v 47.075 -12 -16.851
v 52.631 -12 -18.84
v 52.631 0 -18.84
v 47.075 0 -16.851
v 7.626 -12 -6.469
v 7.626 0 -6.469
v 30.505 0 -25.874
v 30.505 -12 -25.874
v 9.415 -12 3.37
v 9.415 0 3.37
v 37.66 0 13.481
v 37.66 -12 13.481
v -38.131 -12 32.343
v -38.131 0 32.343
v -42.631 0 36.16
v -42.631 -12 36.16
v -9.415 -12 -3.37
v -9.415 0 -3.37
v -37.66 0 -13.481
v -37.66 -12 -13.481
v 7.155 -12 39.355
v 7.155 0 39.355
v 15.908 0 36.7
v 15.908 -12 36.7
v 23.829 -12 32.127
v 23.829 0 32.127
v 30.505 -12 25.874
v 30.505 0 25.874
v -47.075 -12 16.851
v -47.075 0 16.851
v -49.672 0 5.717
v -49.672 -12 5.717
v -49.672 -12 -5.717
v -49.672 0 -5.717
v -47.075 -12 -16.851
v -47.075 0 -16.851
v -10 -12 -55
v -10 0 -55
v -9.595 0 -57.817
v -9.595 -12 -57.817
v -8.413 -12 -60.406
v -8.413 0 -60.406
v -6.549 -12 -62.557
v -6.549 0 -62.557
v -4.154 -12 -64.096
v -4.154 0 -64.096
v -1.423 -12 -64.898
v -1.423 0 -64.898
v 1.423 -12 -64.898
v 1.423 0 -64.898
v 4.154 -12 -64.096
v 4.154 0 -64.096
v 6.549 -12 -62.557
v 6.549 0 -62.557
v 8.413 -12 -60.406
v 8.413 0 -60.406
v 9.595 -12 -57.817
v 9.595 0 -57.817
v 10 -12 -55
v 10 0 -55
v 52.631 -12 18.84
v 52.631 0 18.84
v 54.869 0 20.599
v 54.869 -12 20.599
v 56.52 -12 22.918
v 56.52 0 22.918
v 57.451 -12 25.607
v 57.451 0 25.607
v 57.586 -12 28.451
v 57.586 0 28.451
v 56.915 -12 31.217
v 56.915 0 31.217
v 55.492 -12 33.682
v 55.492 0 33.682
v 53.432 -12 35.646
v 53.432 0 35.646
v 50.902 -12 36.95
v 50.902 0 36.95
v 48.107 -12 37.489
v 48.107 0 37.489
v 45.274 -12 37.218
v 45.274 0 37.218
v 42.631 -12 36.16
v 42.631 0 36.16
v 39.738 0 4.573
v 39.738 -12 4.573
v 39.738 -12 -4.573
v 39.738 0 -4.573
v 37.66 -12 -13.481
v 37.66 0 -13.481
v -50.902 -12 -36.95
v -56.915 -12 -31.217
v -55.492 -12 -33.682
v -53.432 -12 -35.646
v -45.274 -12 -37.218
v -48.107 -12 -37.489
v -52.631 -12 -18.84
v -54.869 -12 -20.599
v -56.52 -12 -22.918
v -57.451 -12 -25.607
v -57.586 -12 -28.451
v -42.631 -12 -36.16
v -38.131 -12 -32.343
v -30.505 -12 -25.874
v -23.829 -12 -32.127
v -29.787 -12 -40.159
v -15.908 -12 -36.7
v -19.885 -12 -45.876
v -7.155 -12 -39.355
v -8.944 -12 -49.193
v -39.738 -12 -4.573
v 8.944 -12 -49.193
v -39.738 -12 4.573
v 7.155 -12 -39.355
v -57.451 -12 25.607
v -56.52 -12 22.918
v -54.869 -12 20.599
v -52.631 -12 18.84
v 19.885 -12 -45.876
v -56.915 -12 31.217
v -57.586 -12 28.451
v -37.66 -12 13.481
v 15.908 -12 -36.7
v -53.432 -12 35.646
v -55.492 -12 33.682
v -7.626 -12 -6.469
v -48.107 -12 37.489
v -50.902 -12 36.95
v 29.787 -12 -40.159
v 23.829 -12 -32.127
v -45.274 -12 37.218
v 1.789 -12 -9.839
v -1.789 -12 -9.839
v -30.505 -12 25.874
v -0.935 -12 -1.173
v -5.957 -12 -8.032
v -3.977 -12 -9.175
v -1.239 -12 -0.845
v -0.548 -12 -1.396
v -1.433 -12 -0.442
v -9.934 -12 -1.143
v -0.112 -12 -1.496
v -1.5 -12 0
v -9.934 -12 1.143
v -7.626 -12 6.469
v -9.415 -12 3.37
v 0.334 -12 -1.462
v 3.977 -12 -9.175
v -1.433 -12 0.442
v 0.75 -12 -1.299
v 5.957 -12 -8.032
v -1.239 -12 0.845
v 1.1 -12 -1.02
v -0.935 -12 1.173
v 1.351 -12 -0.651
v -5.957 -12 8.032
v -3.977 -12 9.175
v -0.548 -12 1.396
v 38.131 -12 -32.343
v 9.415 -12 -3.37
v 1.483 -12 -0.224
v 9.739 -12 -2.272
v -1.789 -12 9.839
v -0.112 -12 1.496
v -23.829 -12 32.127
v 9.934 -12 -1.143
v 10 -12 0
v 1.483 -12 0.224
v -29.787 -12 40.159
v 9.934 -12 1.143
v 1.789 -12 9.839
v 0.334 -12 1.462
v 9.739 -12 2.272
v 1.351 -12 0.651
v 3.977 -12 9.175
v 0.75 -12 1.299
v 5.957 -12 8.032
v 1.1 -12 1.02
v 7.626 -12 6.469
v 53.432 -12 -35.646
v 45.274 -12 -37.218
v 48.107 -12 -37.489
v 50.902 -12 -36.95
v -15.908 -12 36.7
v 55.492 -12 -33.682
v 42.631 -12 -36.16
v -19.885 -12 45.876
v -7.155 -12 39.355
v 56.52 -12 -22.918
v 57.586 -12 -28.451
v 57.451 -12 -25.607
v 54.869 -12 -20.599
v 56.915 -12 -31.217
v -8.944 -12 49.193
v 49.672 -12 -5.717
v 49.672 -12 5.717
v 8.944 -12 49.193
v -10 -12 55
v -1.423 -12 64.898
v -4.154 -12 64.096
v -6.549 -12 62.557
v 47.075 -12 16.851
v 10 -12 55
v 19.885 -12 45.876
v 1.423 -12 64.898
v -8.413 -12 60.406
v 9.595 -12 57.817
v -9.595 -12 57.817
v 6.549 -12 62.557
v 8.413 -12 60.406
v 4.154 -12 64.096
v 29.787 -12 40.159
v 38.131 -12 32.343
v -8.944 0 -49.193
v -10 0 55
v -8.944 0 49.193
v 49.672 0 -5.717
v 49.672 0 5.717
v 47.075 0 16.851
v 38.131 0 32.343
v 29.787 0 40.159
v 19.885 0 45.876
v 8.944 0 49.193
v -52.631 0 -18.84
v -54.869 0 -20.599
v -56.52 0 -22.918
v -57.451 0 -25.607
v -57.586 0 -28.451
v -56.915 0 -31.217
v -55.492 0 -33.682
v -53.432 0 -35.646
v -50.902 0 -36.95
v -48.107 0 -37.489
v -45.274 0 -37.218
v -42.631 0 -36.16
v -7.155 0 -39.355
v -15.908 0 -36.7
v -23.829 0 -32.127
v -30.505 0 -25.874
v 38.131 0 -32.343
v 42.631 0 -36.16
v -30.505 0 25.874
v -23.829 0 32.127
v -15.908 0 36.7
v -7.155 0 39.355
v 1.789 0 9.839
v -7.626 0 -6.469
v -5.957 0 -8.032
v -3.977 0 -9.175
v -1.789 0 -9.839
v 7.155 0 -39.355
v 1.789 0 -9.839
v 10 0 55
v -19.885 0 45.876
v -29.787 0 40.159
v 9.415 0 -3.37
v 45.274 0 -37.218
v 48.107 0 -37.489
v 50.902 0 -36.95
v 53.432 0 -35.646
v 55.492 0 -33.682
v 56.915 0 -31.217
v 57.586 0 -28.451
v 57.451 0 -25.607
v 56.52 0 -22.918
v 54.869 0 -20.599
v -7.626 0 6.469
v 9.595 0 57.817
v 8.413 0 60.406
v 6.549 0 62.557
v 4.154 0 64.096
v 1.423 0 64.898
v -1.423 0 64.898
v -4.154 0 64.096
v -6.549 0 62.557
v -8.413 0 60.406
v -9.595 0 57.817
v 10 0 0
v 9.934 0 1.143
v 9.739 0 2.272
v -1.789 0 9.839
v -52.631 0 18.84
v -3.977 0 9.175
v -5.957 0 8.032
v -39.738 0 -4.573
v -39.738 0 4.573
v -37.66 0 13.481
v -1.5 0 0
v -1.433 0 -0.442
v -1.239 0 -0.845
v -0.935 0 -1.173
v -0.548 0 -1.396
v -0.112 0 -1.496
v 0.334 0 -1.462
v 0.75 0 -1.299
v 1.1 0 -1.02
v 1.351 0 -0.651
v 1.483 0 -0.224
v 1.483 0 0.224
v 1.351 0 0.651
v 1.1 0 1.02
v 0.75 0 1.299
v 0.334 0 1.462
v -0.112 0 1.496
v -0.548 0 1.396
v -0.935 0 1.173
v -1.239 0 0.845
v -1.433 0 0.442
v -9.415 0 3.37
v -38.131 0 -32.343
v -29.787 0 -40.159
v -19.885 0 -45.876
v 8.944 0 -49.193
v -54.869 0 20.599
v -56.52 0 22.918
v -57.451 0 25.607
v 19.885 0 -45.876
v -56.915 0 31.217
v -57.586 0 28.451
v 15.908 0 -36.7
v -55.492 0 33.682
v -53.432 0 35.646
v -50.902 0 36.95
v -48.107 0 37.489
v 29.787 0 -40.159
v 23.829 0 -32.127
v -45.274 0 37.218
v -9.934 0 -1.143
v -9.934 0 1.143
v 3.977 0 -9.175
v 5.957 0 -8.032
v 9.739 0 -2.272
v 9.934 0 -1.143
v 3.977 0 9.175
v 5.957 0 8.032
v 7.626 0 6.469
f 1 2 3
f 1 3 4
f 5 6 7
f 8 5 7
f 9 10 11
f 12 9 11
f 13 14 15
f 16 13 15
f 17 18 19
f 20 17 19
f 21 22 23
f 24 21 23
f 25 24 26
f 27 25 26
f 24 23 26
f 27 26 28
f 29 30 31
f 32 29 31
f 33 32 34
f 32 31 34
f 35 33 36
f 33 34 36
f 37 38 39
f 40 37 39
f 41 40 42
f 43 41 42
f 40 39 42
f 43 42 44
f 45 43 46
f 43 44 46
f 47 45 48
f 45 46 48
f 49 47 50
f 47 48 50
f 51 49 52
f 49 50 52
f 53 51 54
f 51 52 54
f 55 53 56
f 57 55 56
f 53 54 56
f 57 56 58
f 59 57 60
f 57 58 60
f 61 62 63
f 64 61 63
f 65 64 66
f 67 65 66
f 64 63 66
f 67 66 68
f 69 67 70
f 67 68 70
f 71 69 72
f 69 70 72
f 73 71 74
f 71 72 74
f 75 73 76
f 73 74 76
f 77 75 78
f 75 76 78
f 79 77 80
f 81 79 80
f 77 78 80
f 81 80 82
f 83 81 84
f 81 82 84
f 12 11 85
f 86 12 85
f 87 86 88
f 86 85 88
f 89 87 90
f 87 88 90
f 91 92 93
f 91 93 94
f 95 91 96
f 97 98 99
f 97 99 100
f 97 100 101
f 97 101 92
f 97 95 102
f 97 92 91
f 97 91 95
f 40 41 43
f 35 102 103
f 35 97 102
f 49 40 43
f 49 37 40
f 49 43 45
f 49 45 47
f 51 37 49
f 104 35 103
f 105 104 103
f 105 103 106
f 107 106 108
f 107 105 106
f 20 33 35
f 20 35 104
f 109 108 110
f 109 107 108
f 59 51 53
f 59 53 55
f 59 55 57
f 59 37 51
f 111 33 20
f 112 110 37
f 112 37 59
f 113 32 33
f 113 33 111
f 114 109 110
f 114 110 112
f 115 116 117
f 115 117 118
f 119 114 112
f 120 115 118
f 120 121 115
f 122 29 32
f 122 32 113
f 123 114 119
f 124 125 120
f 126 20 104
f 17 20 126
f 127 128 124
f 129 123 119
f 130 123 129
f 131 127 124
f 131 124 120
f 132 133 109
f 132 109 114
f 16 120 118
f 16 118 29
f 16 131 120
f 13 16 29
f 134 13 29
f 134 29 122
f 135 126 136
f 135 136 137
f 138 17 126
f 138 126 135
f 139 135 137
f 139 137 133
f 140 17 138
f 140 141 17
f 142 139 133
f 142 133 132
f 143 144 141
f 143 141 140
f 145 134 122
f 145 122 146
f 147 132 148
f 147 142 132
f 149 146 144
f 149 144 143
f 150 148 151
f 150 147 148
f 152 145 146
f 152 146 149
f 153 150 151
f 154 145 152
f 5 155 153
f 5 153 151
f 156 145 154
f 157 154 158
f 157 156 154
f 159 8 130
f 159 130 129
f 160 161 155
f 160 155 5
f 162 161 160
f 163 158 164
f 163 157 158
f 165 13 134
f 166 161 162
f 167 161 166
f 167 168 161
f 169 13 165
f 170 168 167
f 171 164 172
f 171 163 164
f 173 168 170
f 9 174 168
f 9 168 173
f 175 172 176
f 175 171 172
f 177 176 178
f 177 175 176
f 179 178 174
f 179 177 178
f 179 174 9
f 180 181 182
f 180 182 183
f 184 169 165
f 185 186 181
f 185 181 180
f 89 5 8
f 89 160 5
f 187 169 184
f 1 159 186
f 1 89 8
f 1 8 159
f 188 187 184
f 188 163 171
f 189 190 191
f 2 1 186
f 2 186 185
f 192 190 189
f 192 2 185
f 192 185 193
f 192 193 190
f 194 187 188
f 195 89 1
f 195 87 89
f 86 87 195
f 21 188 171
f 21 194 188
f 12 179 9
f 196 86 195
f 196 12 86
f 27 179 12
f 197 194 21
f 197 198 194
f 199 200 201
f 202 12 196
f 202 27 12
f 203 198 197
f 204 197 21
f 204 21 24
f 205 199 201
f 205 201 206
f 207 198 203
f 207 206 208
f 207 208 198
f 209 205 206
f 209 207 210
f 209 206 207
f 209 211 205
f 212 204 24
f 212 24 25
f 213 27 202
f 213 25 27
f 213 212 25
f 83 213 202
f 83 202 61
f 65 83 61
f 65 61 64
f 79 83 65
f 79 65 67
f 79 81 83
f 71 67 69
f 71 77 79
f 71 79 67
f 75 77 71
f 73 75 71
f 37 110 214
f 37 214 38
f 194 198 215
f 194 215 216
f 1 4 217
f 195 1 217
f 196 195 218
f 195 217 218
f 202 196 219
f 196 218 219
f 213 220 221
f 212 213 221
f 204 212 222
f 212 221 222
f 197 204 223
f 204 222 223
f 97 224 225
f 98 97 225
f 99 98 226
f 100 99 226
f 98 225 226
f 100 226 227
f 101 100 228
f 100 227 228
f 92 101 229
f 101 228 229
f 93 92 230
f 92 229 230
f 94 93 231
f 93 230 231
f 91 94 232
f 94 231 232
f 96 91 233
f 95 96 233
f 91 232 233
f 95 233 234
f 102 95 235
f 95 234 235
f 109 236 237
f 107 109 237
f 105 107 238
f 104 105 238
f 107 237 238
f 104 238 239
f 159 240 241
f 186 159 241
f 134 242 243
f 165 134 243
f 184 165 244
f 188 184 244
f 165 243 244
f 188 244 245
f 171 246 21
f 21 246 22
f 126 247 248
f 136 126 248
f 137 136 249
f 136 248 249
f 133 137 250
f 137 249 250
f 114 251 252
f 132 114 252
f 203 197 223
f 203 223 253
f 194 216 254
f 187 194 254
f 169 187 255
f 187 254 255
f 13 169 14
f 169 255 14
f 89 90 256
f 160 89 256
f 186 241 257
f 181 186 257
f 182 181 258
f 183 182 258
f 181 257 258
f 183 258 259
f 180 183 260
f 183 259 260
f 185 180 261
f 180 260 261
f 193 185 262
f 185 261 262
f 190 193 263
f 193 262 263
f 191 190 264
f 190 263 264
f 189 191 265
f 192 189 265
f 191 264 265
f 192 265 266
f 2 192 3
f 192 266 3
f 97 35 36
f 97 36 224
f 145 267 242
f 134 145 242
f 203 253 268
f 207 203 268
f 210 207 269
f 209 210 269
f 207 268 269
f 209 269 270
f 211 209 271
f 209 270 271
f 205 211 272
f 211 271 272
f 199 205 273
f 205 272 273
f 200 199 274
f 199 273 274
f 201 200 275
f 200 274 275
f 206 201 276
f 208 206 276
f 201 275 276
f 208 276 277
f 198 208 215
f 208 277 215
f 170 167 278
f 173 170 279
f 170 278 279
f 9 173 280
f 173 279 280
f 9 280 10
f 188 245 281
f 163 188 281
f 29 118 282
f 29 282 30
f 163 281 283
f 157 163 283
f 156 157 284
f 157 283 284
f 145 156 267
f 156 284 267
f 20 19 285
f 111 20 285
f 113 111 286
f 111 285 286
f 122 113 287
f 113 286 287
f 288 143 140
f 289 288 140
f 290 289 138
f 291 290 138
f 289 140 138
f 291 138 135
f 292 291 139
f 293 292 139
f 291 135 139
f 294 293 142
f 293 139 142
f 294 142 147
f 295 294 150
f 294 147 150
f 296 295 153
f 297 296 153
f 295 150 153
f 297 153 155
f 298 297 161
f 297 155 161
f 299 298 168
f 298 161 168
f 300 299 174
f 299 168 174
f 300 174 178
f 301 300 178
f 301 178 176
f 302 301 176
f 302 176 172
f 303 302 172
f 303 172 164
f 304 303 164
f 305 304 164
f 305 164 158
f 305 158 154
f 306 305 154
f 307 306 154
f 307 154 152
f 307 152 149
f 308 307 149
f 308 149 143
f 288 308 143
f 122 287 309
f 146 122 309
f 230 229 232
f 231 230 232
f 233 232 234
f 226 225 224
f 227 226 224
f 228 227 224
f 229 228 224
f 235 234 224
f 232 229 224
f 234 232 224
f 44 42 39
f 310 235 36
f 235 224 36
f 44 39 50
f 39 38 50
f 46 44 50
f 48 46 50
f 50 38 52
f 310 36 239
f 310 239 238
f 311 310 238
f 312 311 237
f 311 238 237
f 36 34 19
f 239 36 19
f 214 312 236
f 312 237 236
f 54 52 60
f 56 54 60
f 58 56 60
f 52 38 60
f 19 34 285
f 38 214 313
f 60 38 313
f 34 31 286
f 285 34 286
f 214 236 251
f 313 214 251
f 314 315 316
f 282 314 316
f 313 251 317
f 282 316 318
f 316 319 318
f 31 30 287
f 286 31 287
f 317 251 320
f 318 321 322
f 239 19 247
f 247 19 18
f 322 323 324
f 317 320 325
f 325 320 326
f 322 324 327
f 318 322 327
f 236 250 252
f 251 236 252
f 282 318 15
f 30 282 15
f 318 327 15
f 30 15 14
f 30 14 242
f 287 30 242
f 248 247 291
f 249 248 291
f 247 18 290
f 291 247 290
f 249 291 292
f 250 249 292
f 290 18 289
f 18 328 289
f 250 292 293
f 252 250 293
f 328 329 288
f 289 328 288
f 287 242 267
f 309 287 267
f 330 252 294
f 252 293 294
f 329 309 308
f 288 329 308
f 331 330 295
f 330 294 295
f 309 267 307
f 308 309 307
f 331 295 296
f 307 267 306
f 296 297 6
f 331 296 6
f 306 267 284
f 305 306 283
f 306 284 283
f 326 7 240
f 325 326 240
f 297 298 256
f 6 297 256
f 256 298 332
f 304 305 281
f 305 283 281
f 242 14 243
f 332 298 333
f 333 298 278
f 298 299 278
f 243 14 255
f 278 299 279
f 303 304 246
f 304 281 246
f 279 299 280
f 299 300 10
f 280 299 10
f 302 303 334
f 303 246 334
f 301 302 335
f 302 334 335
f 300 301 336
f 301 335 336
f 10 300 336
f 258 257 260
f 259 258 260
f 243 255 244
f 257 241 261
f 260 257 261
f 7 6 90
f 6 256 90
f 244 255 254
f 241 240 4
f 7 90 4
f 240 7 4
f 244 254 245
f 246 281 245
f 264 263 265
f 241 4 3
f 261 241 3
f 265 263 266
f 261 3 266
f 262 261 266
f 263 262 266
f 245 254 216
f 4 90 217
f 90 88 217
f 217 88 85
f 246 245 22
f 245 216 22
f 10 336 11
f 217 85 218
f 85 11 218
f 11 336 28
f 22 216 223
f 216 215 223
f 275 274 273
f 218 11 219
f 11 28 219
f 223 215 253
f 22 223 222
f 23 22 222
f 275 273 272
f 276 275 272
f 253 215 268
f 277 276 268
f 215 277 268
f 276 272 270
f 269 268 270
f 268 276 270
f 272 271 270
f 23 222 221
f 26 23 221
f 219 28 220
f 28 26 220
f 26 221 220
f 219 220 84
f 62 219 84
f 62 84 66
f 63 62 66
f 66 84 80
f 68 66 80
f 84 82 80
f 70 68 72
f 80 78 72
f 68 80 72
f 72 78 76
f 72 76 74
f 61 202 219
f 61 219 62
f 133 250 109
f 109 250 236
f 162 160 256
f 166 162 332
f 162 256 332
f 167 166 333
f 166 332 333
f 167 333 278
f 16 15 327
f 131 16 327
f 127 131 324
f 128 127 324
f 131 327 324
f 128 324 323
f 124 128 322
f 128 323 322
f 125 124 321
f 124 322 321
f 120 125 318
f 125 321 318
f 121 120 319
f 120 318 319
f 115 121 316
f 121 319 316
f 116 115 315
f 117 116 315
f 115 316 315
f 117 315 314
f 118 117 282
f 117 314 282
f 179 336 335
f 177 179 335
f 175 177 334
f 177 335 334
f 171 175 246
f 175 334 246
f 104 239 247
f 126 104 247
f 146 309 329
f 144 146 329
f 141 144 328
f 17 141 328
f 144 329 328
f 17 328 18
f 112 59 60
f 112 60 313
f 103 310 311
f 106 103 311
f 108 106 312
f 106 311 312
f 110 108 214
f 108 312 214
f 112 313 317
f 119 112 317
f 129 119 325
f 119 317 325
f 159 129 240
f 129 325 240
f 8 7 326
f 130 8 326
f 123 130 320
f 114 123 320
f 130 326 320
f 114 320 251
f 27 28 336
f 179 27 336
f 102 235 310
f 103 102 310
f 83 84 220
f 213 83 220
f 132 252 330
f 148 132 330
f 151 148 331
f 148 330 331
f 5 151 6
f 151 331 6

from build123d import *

# Parameters (mm, degrees)
F1_DEPTH = 1.2
F2_SCALE = 10
F4_D     = 3


with BuildPart() as f1:
    # F0 (on Front) → F1 (new body)
    with BuildSketch(Plane.XZ):
        with BuildLine():
            Line((-3.7659962211, 1.3480624848), (-4.7074952763, 1.685078106))
            ThreePointArc((-4.7074952763, 1.685078106), (-5, 0), (-4.7074952763, -1.685078106))
            Line((-4.7074952763, -1.685078106), (-3.7659962211, -1.3480624848))
            ThreePointArc((-3.7659962211, -1.3480624848), (-4, 0), (-3.7659962211, 1.3480624848))
        make_face()
        with BuildLine():
            Line((-3.0504544683, 2.5874171556), (-3.8130680853, 3.2342714445))
            Line((-3.8130680853, 3.2342714445), (-4.2631397208, 3.6160254038))
            ThreePointArc((-4.2631397208, 3.6160254038), (-5.6291651246, 3.25), (-5.2631397208, 1.8839745962))
            Line((-5.2631397208, 1.8839745962), (-4.7074952763, 1.685078106))
            Line((-4.7074952763, 1.685078106), (-3.7659962211, 1.3480624848))
            Line((-3.7659962211, 1.3480624848), (-0.9414990553, 0.3370156212))
            ThreePointArc((-0.9414990553, 0.3370156212), (-0.8660254038, 0.5), (-0.7626136171, 0.6468542889))
            Line((-0.7626136171, 0.6468542889), (-3.0504544683, 2.5874171556))
        make_face()
        with BuildLine():
            Line((-0.7155417528, 3.9354796404), (-0.894427191, 4.9193495505))
            ThreePointArc((-0.894427191, 4.9193495505), (-2.5, 4.3301270189), (-3.8130680853, 3.2342714445))
            Line((-3.8130680853, 3.2342714445), (-3.0504544683, 2.5874171556))
            ThreePointArc((-3.0504544683, 2.5874171556), (-2, 3.4641016151), (-0.7155417528, 3.9354796404))
        make_face()
        with BuildLine():
            Line((-1, 5.5), (-0.894427191, 4.9193495505))
            Line((-0.894427191, 4.9193495505), (-0.7155417528, 3.9354796404))
            Line((-0.7155417528, 3.9354796404), (-0.1788854382, 0.9838699101))
            ThreePointArc((-0.1788854382, 0.9838699101), (0, 1), (0.1788854382, 0.9838699101))
            Line((0.1788854382, 0.9838699101), (0.7155417528, 3.9354796404))
            Line((0.7155417528, 3.9354796404), (0.894427191, 4.9193495505))
            Line((0.894427191, 4.9193495505), (1, 5.5))
            ThreePointArc((1, 5.5), (0, 6.5), (-1, 5.5))
        make_face()
        with BuildLine():
            ThreePointArc((3.8130680853, 3.2342714445), (2.5, 4.3301270189), (0.894427191, 4.9193495505))
            Line((0.894427191, 4.9193495505), (0.7155417528, 3.9354796404))
            ThreePointArc((0.7155417528, 3.9354796404), (2, 3.4641016151), (3.0504544683, 2.5874171556))
            Line((3.0504544683, 2.5874171556), (3.8130680853, 3.2342714445))
        make_face()
        with BuildLine():
            Line((3.0504544683, 2.5874171556), (0.7626136171, 0.6468542889))
            ThreePointArc((0.7626136171, 0.6468542889), (0.8660254038, 0.5), (0.9414990553, 0.3370156212))
            Line((0.9414990553, 0.3370156212), (3.7659962211, 1.3480624848))
            Line((3.7659962211, 1.3480624848), (4.7074952763, 1.685078106))
            Line((4.7074952763, 1.685078106), (5.2631397208, 1.8839745962))
            ThreePointArc((5.2631397208, 1.8839745962), (5.6291651246, 3.25), (4.2631397208, 3.6160254038))
            Line((4.2631397208, 3.6160254038), (3.8130680853, 3.2342714445))
            Line((3.8130680853, 3.2342714445), (3.0504544683, 2.5874171556))
        make_face()
        with BuildLine():
            Line((4.7074952763, 1.685078106), (3.7659962211, 1.3480624848))
            ThreePointArc((3.7659962211, 1.3480624848), (4, 0), (3.7659962211, -1.3480624848))
            Line((3.7659962211, -1.3480624848), (4.7074952763, -1.685078106))
            ThreePointArc((4.7074952763, -1.685078106), (5, 0), (4.7074952763, 1.685078106))
        make_face()
        with BuildLine():
            Line((3.7659962211, -1.3480624848), (0.9414990553, -0.3370156212))
            ThreePointArc((0.9414990553, -0.3370156212), (0.8660254038, -0.5), (0.7626136171, -0.6468542889))
            Line((0.7626136171, -0.6468542889), (3.0504544683, -2.5874171556))
            Line((3.0504544683, -2.5874171556), (3.8130680853, -3.2342714445))
            Line((3.8130680853, -3.2342714445), (4.2631397208, -3.6160254038))
            ThreePointArc((4.2631397208, -3.6160254038), (5.6291651246, -3.25), (5.2631397208, -1.8839745962))
            Line((5.2631397208, -1.8839745962), (4.7074952763, -1.685078106))
            Line((4.7074952763, -1.685078106), (3.7659962211, -1.3480624848))
        make_face()
        with BuildLine():
            ThreePointArc((3.0504544683, -2.5874171556), (2, -3.4641016151), (0.7155417528, -3.9354796404))
            Line((0.7155417528, -3.9354796404), (0.894427191, -4.9193495505))
            ThreePointArc((0.894427191, -4.9193495505), (2.5, -4.3301270189), (3.8130680853, -3.2342714445))
            Line((3.8130680853, -3.2342714445), (3.0504544683, -2.5874171556))
        make_face()
        with BuildLine():
            ThreePointArc((0.1788854382, -0.9838699101), (0, -1), (-0.1788854382, -0.9838699101))
            Line((-0.1788854382, -0.9838699101), (-0.7155417528, -3.9354796404))
            Line((-0.7155417528, -3.9354796404), (-0.894427191, -4.9193495505))
            Line((-0.894427191, -4.9193495505), (-1, -5.5))
            ThreePointArc((-1, -5.5), (0, -6.5), (1, -5.5))
            Line((1, -5.5), (0.894427191, -4.9193495505))
            Line((0.894427191, -4.9193495505), (0.7155417528, -3.9354796404))
            Line((0.7155417528, -3.9354796404), (0.1788854382, -0.9838699101))
        make_face()
        with BuildLine():
            ThreePointArc((-0.7626136171, -0.6468542889), (-0.8660254038, -0.5), (-0.9414990553, -0.3370156212))
            Line((-0.9414990553, -0.3370156212), (-3.7659962211, -1.3480624848))
            Line((-3.7659962211, -1.3480624848), (-4.7074952763, -1.685078106))
            Line((-4.7074952763, -1.685078106), (-5.2631397208, -1.8839745962))
            ThreePointArc((-5.2631397208, -1.8839745962), (-5.6291651246, -3.25), (-4.2631397208, -3.6160254038))
            Line((-4.2631397208, -3.6160254038), (-3.8130680853, -3.2342714445))
            Line((-3.8130680853, -3.2342714445), (-3.0504544683, -2.5874171556))
            Line((-3.0504544683, -2.5874171556), (-0.7626136171, -0.6468542889))
        make_face()
        with BuildLine():
            ThreePointArc((0.1788854382, 0.9838699101), (0, 1), (-0.1788854382, 0.9838699101))
            ThreePointArc((-0.1788854382, 0.9838699101), (-0.5, 0.8660254038), (-0.7626136171, 0.6468542889))
            ThreePointArc((-0.7626136171, 0.6468542889), (-0.8660254038, 0.5), (-0.9414990553, 0.3370156212))
            ThreePointArc((-0.9414990553, 0.3370156212), (-1, 0), (-0.9414990553, -0.3370156212))
            ThreePointArc((-0.9414990553, -0.3370156212), (-0.8660254038, -0.5), (-0.7626136171, -0.6468542889))
            ThreePointArc((-0.7626136171, -0.6468542889), (-0.5, -0.8660254038), (-0.1788854382, -0.9838699101))
            ThreePointArc((-0.1788854382, -0.9838699101), (0, -1), (0.1788854382, -0.9838699101))
            ThreePointArc((0.1788854382, -0.9838699101), (0.5, -0.8660254038), (0.7626136171, -0.6468542889))
            ThreePointArc((0.7626136171, -0.6468542889), (0.8660254038, -0.5), (0.9414990553, -0.3370156212))
            ThreePointArc((0.9414990553, -0.3370156212), (0.9852662217, -0.1710276947), (1, 0))
            ThreePointArc((1, 0), (0.9852662217, 0.1710276947), (0.9414990553, 0.3370156212))
            ThreePointArc((0.9414990553, 0.3370156212), (0.8660254038, 0.5), (0.7626136171, 0.6468542889))
            ThreePointArc((0.7626136171, 0.6468542889), (0.5, 0.8660254038), (0.1788854382, 0.9838699101))
        make_face()
        with BuildLine():
            ThreePointArc((-0.7155417528, -3.9354796404), (-2, -3.4641016151), (-3.0504544683, -2.5874171556))
            Line((-3.0504544683, -2.5874171556), (-3.8130680853, -3.2342714445))
            ThreePointArc((-3.8130680853, -3.2342714445), (-2.5, -4.3301270189), (-0.894427191, -4.9193495505))
            Line((-0.894427191, -4.9193495505), (-0.7155417528, -3.9354796404))
        make_face()
    extrude(amount=F1_DEPTH)


with BuildPart() as f1_1:
    # F2: moved
    add(f1.part.scale(F2_SCALE))

    # F4 (through all)
    with Locations(Plane(origin=(0, 0, 0), x_dir=(1, 0, 0), z_dir=(0, 1, 0))):
        with Locations((0, 0)):
            Hole(F4_D / 2)


solid = f1_1.part
